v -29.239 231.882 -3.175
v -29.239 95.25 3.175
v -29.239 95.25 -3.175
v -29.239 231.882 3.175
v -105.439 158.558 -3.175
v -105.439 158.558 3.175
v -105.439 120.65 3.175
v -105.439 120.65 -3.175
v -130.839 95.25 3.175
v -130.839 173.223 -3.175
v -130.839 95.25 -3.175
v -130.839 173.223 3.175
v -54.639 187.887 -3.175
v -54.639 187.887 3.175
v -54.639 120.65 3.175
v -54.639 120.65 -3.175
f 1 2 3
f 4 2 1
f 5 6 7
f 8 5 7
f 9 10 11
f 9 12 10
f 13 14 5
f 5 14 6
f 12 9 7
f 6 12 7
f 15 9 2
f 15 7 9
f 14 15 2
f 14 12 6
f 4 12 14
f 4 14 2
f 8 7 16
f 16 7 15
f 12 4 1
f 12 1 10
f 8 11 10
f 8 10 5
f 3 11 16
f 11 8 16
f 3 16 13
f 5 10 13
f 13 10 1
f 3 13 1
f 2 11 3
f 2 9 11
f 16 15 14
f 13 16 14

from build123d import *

# Parameters (mm, degrees)
BOSS_EXTRUDE1_DEPTH = 3.175
CUT_EXTRUDE1_DEPTH  = 267.323293548


with BuildPart() as part:
    # Sketch1 → Boss-Extrude1 (new, symmetric)
    with BuildSketch(Plane.XY):
        Polygon((-130.838522478, 95.25), (-29.238522478, 95.25), (-29.238522478, 231.881554295), (-130.838522478, 173.222766945), align=None)
    extrude(amount=BOSS_EXTRUDE1_DEPTH, both=True)

    # Sketch2 → Cut-Extrude1 (cut, through all)
    with BuildSketch(Plane.XY.offset(3.175)):
        Polygon((-54.638522478, 120.65), (-54.638522478, 187.887463782), (-105.438522478, 158.558070107), (-105.438522478, 120.65), align=None)
    extrude(amount=-CUT_EXTRUDE1_DEPTH, mode=Mode.SUBTRACT)


solid = part.part
